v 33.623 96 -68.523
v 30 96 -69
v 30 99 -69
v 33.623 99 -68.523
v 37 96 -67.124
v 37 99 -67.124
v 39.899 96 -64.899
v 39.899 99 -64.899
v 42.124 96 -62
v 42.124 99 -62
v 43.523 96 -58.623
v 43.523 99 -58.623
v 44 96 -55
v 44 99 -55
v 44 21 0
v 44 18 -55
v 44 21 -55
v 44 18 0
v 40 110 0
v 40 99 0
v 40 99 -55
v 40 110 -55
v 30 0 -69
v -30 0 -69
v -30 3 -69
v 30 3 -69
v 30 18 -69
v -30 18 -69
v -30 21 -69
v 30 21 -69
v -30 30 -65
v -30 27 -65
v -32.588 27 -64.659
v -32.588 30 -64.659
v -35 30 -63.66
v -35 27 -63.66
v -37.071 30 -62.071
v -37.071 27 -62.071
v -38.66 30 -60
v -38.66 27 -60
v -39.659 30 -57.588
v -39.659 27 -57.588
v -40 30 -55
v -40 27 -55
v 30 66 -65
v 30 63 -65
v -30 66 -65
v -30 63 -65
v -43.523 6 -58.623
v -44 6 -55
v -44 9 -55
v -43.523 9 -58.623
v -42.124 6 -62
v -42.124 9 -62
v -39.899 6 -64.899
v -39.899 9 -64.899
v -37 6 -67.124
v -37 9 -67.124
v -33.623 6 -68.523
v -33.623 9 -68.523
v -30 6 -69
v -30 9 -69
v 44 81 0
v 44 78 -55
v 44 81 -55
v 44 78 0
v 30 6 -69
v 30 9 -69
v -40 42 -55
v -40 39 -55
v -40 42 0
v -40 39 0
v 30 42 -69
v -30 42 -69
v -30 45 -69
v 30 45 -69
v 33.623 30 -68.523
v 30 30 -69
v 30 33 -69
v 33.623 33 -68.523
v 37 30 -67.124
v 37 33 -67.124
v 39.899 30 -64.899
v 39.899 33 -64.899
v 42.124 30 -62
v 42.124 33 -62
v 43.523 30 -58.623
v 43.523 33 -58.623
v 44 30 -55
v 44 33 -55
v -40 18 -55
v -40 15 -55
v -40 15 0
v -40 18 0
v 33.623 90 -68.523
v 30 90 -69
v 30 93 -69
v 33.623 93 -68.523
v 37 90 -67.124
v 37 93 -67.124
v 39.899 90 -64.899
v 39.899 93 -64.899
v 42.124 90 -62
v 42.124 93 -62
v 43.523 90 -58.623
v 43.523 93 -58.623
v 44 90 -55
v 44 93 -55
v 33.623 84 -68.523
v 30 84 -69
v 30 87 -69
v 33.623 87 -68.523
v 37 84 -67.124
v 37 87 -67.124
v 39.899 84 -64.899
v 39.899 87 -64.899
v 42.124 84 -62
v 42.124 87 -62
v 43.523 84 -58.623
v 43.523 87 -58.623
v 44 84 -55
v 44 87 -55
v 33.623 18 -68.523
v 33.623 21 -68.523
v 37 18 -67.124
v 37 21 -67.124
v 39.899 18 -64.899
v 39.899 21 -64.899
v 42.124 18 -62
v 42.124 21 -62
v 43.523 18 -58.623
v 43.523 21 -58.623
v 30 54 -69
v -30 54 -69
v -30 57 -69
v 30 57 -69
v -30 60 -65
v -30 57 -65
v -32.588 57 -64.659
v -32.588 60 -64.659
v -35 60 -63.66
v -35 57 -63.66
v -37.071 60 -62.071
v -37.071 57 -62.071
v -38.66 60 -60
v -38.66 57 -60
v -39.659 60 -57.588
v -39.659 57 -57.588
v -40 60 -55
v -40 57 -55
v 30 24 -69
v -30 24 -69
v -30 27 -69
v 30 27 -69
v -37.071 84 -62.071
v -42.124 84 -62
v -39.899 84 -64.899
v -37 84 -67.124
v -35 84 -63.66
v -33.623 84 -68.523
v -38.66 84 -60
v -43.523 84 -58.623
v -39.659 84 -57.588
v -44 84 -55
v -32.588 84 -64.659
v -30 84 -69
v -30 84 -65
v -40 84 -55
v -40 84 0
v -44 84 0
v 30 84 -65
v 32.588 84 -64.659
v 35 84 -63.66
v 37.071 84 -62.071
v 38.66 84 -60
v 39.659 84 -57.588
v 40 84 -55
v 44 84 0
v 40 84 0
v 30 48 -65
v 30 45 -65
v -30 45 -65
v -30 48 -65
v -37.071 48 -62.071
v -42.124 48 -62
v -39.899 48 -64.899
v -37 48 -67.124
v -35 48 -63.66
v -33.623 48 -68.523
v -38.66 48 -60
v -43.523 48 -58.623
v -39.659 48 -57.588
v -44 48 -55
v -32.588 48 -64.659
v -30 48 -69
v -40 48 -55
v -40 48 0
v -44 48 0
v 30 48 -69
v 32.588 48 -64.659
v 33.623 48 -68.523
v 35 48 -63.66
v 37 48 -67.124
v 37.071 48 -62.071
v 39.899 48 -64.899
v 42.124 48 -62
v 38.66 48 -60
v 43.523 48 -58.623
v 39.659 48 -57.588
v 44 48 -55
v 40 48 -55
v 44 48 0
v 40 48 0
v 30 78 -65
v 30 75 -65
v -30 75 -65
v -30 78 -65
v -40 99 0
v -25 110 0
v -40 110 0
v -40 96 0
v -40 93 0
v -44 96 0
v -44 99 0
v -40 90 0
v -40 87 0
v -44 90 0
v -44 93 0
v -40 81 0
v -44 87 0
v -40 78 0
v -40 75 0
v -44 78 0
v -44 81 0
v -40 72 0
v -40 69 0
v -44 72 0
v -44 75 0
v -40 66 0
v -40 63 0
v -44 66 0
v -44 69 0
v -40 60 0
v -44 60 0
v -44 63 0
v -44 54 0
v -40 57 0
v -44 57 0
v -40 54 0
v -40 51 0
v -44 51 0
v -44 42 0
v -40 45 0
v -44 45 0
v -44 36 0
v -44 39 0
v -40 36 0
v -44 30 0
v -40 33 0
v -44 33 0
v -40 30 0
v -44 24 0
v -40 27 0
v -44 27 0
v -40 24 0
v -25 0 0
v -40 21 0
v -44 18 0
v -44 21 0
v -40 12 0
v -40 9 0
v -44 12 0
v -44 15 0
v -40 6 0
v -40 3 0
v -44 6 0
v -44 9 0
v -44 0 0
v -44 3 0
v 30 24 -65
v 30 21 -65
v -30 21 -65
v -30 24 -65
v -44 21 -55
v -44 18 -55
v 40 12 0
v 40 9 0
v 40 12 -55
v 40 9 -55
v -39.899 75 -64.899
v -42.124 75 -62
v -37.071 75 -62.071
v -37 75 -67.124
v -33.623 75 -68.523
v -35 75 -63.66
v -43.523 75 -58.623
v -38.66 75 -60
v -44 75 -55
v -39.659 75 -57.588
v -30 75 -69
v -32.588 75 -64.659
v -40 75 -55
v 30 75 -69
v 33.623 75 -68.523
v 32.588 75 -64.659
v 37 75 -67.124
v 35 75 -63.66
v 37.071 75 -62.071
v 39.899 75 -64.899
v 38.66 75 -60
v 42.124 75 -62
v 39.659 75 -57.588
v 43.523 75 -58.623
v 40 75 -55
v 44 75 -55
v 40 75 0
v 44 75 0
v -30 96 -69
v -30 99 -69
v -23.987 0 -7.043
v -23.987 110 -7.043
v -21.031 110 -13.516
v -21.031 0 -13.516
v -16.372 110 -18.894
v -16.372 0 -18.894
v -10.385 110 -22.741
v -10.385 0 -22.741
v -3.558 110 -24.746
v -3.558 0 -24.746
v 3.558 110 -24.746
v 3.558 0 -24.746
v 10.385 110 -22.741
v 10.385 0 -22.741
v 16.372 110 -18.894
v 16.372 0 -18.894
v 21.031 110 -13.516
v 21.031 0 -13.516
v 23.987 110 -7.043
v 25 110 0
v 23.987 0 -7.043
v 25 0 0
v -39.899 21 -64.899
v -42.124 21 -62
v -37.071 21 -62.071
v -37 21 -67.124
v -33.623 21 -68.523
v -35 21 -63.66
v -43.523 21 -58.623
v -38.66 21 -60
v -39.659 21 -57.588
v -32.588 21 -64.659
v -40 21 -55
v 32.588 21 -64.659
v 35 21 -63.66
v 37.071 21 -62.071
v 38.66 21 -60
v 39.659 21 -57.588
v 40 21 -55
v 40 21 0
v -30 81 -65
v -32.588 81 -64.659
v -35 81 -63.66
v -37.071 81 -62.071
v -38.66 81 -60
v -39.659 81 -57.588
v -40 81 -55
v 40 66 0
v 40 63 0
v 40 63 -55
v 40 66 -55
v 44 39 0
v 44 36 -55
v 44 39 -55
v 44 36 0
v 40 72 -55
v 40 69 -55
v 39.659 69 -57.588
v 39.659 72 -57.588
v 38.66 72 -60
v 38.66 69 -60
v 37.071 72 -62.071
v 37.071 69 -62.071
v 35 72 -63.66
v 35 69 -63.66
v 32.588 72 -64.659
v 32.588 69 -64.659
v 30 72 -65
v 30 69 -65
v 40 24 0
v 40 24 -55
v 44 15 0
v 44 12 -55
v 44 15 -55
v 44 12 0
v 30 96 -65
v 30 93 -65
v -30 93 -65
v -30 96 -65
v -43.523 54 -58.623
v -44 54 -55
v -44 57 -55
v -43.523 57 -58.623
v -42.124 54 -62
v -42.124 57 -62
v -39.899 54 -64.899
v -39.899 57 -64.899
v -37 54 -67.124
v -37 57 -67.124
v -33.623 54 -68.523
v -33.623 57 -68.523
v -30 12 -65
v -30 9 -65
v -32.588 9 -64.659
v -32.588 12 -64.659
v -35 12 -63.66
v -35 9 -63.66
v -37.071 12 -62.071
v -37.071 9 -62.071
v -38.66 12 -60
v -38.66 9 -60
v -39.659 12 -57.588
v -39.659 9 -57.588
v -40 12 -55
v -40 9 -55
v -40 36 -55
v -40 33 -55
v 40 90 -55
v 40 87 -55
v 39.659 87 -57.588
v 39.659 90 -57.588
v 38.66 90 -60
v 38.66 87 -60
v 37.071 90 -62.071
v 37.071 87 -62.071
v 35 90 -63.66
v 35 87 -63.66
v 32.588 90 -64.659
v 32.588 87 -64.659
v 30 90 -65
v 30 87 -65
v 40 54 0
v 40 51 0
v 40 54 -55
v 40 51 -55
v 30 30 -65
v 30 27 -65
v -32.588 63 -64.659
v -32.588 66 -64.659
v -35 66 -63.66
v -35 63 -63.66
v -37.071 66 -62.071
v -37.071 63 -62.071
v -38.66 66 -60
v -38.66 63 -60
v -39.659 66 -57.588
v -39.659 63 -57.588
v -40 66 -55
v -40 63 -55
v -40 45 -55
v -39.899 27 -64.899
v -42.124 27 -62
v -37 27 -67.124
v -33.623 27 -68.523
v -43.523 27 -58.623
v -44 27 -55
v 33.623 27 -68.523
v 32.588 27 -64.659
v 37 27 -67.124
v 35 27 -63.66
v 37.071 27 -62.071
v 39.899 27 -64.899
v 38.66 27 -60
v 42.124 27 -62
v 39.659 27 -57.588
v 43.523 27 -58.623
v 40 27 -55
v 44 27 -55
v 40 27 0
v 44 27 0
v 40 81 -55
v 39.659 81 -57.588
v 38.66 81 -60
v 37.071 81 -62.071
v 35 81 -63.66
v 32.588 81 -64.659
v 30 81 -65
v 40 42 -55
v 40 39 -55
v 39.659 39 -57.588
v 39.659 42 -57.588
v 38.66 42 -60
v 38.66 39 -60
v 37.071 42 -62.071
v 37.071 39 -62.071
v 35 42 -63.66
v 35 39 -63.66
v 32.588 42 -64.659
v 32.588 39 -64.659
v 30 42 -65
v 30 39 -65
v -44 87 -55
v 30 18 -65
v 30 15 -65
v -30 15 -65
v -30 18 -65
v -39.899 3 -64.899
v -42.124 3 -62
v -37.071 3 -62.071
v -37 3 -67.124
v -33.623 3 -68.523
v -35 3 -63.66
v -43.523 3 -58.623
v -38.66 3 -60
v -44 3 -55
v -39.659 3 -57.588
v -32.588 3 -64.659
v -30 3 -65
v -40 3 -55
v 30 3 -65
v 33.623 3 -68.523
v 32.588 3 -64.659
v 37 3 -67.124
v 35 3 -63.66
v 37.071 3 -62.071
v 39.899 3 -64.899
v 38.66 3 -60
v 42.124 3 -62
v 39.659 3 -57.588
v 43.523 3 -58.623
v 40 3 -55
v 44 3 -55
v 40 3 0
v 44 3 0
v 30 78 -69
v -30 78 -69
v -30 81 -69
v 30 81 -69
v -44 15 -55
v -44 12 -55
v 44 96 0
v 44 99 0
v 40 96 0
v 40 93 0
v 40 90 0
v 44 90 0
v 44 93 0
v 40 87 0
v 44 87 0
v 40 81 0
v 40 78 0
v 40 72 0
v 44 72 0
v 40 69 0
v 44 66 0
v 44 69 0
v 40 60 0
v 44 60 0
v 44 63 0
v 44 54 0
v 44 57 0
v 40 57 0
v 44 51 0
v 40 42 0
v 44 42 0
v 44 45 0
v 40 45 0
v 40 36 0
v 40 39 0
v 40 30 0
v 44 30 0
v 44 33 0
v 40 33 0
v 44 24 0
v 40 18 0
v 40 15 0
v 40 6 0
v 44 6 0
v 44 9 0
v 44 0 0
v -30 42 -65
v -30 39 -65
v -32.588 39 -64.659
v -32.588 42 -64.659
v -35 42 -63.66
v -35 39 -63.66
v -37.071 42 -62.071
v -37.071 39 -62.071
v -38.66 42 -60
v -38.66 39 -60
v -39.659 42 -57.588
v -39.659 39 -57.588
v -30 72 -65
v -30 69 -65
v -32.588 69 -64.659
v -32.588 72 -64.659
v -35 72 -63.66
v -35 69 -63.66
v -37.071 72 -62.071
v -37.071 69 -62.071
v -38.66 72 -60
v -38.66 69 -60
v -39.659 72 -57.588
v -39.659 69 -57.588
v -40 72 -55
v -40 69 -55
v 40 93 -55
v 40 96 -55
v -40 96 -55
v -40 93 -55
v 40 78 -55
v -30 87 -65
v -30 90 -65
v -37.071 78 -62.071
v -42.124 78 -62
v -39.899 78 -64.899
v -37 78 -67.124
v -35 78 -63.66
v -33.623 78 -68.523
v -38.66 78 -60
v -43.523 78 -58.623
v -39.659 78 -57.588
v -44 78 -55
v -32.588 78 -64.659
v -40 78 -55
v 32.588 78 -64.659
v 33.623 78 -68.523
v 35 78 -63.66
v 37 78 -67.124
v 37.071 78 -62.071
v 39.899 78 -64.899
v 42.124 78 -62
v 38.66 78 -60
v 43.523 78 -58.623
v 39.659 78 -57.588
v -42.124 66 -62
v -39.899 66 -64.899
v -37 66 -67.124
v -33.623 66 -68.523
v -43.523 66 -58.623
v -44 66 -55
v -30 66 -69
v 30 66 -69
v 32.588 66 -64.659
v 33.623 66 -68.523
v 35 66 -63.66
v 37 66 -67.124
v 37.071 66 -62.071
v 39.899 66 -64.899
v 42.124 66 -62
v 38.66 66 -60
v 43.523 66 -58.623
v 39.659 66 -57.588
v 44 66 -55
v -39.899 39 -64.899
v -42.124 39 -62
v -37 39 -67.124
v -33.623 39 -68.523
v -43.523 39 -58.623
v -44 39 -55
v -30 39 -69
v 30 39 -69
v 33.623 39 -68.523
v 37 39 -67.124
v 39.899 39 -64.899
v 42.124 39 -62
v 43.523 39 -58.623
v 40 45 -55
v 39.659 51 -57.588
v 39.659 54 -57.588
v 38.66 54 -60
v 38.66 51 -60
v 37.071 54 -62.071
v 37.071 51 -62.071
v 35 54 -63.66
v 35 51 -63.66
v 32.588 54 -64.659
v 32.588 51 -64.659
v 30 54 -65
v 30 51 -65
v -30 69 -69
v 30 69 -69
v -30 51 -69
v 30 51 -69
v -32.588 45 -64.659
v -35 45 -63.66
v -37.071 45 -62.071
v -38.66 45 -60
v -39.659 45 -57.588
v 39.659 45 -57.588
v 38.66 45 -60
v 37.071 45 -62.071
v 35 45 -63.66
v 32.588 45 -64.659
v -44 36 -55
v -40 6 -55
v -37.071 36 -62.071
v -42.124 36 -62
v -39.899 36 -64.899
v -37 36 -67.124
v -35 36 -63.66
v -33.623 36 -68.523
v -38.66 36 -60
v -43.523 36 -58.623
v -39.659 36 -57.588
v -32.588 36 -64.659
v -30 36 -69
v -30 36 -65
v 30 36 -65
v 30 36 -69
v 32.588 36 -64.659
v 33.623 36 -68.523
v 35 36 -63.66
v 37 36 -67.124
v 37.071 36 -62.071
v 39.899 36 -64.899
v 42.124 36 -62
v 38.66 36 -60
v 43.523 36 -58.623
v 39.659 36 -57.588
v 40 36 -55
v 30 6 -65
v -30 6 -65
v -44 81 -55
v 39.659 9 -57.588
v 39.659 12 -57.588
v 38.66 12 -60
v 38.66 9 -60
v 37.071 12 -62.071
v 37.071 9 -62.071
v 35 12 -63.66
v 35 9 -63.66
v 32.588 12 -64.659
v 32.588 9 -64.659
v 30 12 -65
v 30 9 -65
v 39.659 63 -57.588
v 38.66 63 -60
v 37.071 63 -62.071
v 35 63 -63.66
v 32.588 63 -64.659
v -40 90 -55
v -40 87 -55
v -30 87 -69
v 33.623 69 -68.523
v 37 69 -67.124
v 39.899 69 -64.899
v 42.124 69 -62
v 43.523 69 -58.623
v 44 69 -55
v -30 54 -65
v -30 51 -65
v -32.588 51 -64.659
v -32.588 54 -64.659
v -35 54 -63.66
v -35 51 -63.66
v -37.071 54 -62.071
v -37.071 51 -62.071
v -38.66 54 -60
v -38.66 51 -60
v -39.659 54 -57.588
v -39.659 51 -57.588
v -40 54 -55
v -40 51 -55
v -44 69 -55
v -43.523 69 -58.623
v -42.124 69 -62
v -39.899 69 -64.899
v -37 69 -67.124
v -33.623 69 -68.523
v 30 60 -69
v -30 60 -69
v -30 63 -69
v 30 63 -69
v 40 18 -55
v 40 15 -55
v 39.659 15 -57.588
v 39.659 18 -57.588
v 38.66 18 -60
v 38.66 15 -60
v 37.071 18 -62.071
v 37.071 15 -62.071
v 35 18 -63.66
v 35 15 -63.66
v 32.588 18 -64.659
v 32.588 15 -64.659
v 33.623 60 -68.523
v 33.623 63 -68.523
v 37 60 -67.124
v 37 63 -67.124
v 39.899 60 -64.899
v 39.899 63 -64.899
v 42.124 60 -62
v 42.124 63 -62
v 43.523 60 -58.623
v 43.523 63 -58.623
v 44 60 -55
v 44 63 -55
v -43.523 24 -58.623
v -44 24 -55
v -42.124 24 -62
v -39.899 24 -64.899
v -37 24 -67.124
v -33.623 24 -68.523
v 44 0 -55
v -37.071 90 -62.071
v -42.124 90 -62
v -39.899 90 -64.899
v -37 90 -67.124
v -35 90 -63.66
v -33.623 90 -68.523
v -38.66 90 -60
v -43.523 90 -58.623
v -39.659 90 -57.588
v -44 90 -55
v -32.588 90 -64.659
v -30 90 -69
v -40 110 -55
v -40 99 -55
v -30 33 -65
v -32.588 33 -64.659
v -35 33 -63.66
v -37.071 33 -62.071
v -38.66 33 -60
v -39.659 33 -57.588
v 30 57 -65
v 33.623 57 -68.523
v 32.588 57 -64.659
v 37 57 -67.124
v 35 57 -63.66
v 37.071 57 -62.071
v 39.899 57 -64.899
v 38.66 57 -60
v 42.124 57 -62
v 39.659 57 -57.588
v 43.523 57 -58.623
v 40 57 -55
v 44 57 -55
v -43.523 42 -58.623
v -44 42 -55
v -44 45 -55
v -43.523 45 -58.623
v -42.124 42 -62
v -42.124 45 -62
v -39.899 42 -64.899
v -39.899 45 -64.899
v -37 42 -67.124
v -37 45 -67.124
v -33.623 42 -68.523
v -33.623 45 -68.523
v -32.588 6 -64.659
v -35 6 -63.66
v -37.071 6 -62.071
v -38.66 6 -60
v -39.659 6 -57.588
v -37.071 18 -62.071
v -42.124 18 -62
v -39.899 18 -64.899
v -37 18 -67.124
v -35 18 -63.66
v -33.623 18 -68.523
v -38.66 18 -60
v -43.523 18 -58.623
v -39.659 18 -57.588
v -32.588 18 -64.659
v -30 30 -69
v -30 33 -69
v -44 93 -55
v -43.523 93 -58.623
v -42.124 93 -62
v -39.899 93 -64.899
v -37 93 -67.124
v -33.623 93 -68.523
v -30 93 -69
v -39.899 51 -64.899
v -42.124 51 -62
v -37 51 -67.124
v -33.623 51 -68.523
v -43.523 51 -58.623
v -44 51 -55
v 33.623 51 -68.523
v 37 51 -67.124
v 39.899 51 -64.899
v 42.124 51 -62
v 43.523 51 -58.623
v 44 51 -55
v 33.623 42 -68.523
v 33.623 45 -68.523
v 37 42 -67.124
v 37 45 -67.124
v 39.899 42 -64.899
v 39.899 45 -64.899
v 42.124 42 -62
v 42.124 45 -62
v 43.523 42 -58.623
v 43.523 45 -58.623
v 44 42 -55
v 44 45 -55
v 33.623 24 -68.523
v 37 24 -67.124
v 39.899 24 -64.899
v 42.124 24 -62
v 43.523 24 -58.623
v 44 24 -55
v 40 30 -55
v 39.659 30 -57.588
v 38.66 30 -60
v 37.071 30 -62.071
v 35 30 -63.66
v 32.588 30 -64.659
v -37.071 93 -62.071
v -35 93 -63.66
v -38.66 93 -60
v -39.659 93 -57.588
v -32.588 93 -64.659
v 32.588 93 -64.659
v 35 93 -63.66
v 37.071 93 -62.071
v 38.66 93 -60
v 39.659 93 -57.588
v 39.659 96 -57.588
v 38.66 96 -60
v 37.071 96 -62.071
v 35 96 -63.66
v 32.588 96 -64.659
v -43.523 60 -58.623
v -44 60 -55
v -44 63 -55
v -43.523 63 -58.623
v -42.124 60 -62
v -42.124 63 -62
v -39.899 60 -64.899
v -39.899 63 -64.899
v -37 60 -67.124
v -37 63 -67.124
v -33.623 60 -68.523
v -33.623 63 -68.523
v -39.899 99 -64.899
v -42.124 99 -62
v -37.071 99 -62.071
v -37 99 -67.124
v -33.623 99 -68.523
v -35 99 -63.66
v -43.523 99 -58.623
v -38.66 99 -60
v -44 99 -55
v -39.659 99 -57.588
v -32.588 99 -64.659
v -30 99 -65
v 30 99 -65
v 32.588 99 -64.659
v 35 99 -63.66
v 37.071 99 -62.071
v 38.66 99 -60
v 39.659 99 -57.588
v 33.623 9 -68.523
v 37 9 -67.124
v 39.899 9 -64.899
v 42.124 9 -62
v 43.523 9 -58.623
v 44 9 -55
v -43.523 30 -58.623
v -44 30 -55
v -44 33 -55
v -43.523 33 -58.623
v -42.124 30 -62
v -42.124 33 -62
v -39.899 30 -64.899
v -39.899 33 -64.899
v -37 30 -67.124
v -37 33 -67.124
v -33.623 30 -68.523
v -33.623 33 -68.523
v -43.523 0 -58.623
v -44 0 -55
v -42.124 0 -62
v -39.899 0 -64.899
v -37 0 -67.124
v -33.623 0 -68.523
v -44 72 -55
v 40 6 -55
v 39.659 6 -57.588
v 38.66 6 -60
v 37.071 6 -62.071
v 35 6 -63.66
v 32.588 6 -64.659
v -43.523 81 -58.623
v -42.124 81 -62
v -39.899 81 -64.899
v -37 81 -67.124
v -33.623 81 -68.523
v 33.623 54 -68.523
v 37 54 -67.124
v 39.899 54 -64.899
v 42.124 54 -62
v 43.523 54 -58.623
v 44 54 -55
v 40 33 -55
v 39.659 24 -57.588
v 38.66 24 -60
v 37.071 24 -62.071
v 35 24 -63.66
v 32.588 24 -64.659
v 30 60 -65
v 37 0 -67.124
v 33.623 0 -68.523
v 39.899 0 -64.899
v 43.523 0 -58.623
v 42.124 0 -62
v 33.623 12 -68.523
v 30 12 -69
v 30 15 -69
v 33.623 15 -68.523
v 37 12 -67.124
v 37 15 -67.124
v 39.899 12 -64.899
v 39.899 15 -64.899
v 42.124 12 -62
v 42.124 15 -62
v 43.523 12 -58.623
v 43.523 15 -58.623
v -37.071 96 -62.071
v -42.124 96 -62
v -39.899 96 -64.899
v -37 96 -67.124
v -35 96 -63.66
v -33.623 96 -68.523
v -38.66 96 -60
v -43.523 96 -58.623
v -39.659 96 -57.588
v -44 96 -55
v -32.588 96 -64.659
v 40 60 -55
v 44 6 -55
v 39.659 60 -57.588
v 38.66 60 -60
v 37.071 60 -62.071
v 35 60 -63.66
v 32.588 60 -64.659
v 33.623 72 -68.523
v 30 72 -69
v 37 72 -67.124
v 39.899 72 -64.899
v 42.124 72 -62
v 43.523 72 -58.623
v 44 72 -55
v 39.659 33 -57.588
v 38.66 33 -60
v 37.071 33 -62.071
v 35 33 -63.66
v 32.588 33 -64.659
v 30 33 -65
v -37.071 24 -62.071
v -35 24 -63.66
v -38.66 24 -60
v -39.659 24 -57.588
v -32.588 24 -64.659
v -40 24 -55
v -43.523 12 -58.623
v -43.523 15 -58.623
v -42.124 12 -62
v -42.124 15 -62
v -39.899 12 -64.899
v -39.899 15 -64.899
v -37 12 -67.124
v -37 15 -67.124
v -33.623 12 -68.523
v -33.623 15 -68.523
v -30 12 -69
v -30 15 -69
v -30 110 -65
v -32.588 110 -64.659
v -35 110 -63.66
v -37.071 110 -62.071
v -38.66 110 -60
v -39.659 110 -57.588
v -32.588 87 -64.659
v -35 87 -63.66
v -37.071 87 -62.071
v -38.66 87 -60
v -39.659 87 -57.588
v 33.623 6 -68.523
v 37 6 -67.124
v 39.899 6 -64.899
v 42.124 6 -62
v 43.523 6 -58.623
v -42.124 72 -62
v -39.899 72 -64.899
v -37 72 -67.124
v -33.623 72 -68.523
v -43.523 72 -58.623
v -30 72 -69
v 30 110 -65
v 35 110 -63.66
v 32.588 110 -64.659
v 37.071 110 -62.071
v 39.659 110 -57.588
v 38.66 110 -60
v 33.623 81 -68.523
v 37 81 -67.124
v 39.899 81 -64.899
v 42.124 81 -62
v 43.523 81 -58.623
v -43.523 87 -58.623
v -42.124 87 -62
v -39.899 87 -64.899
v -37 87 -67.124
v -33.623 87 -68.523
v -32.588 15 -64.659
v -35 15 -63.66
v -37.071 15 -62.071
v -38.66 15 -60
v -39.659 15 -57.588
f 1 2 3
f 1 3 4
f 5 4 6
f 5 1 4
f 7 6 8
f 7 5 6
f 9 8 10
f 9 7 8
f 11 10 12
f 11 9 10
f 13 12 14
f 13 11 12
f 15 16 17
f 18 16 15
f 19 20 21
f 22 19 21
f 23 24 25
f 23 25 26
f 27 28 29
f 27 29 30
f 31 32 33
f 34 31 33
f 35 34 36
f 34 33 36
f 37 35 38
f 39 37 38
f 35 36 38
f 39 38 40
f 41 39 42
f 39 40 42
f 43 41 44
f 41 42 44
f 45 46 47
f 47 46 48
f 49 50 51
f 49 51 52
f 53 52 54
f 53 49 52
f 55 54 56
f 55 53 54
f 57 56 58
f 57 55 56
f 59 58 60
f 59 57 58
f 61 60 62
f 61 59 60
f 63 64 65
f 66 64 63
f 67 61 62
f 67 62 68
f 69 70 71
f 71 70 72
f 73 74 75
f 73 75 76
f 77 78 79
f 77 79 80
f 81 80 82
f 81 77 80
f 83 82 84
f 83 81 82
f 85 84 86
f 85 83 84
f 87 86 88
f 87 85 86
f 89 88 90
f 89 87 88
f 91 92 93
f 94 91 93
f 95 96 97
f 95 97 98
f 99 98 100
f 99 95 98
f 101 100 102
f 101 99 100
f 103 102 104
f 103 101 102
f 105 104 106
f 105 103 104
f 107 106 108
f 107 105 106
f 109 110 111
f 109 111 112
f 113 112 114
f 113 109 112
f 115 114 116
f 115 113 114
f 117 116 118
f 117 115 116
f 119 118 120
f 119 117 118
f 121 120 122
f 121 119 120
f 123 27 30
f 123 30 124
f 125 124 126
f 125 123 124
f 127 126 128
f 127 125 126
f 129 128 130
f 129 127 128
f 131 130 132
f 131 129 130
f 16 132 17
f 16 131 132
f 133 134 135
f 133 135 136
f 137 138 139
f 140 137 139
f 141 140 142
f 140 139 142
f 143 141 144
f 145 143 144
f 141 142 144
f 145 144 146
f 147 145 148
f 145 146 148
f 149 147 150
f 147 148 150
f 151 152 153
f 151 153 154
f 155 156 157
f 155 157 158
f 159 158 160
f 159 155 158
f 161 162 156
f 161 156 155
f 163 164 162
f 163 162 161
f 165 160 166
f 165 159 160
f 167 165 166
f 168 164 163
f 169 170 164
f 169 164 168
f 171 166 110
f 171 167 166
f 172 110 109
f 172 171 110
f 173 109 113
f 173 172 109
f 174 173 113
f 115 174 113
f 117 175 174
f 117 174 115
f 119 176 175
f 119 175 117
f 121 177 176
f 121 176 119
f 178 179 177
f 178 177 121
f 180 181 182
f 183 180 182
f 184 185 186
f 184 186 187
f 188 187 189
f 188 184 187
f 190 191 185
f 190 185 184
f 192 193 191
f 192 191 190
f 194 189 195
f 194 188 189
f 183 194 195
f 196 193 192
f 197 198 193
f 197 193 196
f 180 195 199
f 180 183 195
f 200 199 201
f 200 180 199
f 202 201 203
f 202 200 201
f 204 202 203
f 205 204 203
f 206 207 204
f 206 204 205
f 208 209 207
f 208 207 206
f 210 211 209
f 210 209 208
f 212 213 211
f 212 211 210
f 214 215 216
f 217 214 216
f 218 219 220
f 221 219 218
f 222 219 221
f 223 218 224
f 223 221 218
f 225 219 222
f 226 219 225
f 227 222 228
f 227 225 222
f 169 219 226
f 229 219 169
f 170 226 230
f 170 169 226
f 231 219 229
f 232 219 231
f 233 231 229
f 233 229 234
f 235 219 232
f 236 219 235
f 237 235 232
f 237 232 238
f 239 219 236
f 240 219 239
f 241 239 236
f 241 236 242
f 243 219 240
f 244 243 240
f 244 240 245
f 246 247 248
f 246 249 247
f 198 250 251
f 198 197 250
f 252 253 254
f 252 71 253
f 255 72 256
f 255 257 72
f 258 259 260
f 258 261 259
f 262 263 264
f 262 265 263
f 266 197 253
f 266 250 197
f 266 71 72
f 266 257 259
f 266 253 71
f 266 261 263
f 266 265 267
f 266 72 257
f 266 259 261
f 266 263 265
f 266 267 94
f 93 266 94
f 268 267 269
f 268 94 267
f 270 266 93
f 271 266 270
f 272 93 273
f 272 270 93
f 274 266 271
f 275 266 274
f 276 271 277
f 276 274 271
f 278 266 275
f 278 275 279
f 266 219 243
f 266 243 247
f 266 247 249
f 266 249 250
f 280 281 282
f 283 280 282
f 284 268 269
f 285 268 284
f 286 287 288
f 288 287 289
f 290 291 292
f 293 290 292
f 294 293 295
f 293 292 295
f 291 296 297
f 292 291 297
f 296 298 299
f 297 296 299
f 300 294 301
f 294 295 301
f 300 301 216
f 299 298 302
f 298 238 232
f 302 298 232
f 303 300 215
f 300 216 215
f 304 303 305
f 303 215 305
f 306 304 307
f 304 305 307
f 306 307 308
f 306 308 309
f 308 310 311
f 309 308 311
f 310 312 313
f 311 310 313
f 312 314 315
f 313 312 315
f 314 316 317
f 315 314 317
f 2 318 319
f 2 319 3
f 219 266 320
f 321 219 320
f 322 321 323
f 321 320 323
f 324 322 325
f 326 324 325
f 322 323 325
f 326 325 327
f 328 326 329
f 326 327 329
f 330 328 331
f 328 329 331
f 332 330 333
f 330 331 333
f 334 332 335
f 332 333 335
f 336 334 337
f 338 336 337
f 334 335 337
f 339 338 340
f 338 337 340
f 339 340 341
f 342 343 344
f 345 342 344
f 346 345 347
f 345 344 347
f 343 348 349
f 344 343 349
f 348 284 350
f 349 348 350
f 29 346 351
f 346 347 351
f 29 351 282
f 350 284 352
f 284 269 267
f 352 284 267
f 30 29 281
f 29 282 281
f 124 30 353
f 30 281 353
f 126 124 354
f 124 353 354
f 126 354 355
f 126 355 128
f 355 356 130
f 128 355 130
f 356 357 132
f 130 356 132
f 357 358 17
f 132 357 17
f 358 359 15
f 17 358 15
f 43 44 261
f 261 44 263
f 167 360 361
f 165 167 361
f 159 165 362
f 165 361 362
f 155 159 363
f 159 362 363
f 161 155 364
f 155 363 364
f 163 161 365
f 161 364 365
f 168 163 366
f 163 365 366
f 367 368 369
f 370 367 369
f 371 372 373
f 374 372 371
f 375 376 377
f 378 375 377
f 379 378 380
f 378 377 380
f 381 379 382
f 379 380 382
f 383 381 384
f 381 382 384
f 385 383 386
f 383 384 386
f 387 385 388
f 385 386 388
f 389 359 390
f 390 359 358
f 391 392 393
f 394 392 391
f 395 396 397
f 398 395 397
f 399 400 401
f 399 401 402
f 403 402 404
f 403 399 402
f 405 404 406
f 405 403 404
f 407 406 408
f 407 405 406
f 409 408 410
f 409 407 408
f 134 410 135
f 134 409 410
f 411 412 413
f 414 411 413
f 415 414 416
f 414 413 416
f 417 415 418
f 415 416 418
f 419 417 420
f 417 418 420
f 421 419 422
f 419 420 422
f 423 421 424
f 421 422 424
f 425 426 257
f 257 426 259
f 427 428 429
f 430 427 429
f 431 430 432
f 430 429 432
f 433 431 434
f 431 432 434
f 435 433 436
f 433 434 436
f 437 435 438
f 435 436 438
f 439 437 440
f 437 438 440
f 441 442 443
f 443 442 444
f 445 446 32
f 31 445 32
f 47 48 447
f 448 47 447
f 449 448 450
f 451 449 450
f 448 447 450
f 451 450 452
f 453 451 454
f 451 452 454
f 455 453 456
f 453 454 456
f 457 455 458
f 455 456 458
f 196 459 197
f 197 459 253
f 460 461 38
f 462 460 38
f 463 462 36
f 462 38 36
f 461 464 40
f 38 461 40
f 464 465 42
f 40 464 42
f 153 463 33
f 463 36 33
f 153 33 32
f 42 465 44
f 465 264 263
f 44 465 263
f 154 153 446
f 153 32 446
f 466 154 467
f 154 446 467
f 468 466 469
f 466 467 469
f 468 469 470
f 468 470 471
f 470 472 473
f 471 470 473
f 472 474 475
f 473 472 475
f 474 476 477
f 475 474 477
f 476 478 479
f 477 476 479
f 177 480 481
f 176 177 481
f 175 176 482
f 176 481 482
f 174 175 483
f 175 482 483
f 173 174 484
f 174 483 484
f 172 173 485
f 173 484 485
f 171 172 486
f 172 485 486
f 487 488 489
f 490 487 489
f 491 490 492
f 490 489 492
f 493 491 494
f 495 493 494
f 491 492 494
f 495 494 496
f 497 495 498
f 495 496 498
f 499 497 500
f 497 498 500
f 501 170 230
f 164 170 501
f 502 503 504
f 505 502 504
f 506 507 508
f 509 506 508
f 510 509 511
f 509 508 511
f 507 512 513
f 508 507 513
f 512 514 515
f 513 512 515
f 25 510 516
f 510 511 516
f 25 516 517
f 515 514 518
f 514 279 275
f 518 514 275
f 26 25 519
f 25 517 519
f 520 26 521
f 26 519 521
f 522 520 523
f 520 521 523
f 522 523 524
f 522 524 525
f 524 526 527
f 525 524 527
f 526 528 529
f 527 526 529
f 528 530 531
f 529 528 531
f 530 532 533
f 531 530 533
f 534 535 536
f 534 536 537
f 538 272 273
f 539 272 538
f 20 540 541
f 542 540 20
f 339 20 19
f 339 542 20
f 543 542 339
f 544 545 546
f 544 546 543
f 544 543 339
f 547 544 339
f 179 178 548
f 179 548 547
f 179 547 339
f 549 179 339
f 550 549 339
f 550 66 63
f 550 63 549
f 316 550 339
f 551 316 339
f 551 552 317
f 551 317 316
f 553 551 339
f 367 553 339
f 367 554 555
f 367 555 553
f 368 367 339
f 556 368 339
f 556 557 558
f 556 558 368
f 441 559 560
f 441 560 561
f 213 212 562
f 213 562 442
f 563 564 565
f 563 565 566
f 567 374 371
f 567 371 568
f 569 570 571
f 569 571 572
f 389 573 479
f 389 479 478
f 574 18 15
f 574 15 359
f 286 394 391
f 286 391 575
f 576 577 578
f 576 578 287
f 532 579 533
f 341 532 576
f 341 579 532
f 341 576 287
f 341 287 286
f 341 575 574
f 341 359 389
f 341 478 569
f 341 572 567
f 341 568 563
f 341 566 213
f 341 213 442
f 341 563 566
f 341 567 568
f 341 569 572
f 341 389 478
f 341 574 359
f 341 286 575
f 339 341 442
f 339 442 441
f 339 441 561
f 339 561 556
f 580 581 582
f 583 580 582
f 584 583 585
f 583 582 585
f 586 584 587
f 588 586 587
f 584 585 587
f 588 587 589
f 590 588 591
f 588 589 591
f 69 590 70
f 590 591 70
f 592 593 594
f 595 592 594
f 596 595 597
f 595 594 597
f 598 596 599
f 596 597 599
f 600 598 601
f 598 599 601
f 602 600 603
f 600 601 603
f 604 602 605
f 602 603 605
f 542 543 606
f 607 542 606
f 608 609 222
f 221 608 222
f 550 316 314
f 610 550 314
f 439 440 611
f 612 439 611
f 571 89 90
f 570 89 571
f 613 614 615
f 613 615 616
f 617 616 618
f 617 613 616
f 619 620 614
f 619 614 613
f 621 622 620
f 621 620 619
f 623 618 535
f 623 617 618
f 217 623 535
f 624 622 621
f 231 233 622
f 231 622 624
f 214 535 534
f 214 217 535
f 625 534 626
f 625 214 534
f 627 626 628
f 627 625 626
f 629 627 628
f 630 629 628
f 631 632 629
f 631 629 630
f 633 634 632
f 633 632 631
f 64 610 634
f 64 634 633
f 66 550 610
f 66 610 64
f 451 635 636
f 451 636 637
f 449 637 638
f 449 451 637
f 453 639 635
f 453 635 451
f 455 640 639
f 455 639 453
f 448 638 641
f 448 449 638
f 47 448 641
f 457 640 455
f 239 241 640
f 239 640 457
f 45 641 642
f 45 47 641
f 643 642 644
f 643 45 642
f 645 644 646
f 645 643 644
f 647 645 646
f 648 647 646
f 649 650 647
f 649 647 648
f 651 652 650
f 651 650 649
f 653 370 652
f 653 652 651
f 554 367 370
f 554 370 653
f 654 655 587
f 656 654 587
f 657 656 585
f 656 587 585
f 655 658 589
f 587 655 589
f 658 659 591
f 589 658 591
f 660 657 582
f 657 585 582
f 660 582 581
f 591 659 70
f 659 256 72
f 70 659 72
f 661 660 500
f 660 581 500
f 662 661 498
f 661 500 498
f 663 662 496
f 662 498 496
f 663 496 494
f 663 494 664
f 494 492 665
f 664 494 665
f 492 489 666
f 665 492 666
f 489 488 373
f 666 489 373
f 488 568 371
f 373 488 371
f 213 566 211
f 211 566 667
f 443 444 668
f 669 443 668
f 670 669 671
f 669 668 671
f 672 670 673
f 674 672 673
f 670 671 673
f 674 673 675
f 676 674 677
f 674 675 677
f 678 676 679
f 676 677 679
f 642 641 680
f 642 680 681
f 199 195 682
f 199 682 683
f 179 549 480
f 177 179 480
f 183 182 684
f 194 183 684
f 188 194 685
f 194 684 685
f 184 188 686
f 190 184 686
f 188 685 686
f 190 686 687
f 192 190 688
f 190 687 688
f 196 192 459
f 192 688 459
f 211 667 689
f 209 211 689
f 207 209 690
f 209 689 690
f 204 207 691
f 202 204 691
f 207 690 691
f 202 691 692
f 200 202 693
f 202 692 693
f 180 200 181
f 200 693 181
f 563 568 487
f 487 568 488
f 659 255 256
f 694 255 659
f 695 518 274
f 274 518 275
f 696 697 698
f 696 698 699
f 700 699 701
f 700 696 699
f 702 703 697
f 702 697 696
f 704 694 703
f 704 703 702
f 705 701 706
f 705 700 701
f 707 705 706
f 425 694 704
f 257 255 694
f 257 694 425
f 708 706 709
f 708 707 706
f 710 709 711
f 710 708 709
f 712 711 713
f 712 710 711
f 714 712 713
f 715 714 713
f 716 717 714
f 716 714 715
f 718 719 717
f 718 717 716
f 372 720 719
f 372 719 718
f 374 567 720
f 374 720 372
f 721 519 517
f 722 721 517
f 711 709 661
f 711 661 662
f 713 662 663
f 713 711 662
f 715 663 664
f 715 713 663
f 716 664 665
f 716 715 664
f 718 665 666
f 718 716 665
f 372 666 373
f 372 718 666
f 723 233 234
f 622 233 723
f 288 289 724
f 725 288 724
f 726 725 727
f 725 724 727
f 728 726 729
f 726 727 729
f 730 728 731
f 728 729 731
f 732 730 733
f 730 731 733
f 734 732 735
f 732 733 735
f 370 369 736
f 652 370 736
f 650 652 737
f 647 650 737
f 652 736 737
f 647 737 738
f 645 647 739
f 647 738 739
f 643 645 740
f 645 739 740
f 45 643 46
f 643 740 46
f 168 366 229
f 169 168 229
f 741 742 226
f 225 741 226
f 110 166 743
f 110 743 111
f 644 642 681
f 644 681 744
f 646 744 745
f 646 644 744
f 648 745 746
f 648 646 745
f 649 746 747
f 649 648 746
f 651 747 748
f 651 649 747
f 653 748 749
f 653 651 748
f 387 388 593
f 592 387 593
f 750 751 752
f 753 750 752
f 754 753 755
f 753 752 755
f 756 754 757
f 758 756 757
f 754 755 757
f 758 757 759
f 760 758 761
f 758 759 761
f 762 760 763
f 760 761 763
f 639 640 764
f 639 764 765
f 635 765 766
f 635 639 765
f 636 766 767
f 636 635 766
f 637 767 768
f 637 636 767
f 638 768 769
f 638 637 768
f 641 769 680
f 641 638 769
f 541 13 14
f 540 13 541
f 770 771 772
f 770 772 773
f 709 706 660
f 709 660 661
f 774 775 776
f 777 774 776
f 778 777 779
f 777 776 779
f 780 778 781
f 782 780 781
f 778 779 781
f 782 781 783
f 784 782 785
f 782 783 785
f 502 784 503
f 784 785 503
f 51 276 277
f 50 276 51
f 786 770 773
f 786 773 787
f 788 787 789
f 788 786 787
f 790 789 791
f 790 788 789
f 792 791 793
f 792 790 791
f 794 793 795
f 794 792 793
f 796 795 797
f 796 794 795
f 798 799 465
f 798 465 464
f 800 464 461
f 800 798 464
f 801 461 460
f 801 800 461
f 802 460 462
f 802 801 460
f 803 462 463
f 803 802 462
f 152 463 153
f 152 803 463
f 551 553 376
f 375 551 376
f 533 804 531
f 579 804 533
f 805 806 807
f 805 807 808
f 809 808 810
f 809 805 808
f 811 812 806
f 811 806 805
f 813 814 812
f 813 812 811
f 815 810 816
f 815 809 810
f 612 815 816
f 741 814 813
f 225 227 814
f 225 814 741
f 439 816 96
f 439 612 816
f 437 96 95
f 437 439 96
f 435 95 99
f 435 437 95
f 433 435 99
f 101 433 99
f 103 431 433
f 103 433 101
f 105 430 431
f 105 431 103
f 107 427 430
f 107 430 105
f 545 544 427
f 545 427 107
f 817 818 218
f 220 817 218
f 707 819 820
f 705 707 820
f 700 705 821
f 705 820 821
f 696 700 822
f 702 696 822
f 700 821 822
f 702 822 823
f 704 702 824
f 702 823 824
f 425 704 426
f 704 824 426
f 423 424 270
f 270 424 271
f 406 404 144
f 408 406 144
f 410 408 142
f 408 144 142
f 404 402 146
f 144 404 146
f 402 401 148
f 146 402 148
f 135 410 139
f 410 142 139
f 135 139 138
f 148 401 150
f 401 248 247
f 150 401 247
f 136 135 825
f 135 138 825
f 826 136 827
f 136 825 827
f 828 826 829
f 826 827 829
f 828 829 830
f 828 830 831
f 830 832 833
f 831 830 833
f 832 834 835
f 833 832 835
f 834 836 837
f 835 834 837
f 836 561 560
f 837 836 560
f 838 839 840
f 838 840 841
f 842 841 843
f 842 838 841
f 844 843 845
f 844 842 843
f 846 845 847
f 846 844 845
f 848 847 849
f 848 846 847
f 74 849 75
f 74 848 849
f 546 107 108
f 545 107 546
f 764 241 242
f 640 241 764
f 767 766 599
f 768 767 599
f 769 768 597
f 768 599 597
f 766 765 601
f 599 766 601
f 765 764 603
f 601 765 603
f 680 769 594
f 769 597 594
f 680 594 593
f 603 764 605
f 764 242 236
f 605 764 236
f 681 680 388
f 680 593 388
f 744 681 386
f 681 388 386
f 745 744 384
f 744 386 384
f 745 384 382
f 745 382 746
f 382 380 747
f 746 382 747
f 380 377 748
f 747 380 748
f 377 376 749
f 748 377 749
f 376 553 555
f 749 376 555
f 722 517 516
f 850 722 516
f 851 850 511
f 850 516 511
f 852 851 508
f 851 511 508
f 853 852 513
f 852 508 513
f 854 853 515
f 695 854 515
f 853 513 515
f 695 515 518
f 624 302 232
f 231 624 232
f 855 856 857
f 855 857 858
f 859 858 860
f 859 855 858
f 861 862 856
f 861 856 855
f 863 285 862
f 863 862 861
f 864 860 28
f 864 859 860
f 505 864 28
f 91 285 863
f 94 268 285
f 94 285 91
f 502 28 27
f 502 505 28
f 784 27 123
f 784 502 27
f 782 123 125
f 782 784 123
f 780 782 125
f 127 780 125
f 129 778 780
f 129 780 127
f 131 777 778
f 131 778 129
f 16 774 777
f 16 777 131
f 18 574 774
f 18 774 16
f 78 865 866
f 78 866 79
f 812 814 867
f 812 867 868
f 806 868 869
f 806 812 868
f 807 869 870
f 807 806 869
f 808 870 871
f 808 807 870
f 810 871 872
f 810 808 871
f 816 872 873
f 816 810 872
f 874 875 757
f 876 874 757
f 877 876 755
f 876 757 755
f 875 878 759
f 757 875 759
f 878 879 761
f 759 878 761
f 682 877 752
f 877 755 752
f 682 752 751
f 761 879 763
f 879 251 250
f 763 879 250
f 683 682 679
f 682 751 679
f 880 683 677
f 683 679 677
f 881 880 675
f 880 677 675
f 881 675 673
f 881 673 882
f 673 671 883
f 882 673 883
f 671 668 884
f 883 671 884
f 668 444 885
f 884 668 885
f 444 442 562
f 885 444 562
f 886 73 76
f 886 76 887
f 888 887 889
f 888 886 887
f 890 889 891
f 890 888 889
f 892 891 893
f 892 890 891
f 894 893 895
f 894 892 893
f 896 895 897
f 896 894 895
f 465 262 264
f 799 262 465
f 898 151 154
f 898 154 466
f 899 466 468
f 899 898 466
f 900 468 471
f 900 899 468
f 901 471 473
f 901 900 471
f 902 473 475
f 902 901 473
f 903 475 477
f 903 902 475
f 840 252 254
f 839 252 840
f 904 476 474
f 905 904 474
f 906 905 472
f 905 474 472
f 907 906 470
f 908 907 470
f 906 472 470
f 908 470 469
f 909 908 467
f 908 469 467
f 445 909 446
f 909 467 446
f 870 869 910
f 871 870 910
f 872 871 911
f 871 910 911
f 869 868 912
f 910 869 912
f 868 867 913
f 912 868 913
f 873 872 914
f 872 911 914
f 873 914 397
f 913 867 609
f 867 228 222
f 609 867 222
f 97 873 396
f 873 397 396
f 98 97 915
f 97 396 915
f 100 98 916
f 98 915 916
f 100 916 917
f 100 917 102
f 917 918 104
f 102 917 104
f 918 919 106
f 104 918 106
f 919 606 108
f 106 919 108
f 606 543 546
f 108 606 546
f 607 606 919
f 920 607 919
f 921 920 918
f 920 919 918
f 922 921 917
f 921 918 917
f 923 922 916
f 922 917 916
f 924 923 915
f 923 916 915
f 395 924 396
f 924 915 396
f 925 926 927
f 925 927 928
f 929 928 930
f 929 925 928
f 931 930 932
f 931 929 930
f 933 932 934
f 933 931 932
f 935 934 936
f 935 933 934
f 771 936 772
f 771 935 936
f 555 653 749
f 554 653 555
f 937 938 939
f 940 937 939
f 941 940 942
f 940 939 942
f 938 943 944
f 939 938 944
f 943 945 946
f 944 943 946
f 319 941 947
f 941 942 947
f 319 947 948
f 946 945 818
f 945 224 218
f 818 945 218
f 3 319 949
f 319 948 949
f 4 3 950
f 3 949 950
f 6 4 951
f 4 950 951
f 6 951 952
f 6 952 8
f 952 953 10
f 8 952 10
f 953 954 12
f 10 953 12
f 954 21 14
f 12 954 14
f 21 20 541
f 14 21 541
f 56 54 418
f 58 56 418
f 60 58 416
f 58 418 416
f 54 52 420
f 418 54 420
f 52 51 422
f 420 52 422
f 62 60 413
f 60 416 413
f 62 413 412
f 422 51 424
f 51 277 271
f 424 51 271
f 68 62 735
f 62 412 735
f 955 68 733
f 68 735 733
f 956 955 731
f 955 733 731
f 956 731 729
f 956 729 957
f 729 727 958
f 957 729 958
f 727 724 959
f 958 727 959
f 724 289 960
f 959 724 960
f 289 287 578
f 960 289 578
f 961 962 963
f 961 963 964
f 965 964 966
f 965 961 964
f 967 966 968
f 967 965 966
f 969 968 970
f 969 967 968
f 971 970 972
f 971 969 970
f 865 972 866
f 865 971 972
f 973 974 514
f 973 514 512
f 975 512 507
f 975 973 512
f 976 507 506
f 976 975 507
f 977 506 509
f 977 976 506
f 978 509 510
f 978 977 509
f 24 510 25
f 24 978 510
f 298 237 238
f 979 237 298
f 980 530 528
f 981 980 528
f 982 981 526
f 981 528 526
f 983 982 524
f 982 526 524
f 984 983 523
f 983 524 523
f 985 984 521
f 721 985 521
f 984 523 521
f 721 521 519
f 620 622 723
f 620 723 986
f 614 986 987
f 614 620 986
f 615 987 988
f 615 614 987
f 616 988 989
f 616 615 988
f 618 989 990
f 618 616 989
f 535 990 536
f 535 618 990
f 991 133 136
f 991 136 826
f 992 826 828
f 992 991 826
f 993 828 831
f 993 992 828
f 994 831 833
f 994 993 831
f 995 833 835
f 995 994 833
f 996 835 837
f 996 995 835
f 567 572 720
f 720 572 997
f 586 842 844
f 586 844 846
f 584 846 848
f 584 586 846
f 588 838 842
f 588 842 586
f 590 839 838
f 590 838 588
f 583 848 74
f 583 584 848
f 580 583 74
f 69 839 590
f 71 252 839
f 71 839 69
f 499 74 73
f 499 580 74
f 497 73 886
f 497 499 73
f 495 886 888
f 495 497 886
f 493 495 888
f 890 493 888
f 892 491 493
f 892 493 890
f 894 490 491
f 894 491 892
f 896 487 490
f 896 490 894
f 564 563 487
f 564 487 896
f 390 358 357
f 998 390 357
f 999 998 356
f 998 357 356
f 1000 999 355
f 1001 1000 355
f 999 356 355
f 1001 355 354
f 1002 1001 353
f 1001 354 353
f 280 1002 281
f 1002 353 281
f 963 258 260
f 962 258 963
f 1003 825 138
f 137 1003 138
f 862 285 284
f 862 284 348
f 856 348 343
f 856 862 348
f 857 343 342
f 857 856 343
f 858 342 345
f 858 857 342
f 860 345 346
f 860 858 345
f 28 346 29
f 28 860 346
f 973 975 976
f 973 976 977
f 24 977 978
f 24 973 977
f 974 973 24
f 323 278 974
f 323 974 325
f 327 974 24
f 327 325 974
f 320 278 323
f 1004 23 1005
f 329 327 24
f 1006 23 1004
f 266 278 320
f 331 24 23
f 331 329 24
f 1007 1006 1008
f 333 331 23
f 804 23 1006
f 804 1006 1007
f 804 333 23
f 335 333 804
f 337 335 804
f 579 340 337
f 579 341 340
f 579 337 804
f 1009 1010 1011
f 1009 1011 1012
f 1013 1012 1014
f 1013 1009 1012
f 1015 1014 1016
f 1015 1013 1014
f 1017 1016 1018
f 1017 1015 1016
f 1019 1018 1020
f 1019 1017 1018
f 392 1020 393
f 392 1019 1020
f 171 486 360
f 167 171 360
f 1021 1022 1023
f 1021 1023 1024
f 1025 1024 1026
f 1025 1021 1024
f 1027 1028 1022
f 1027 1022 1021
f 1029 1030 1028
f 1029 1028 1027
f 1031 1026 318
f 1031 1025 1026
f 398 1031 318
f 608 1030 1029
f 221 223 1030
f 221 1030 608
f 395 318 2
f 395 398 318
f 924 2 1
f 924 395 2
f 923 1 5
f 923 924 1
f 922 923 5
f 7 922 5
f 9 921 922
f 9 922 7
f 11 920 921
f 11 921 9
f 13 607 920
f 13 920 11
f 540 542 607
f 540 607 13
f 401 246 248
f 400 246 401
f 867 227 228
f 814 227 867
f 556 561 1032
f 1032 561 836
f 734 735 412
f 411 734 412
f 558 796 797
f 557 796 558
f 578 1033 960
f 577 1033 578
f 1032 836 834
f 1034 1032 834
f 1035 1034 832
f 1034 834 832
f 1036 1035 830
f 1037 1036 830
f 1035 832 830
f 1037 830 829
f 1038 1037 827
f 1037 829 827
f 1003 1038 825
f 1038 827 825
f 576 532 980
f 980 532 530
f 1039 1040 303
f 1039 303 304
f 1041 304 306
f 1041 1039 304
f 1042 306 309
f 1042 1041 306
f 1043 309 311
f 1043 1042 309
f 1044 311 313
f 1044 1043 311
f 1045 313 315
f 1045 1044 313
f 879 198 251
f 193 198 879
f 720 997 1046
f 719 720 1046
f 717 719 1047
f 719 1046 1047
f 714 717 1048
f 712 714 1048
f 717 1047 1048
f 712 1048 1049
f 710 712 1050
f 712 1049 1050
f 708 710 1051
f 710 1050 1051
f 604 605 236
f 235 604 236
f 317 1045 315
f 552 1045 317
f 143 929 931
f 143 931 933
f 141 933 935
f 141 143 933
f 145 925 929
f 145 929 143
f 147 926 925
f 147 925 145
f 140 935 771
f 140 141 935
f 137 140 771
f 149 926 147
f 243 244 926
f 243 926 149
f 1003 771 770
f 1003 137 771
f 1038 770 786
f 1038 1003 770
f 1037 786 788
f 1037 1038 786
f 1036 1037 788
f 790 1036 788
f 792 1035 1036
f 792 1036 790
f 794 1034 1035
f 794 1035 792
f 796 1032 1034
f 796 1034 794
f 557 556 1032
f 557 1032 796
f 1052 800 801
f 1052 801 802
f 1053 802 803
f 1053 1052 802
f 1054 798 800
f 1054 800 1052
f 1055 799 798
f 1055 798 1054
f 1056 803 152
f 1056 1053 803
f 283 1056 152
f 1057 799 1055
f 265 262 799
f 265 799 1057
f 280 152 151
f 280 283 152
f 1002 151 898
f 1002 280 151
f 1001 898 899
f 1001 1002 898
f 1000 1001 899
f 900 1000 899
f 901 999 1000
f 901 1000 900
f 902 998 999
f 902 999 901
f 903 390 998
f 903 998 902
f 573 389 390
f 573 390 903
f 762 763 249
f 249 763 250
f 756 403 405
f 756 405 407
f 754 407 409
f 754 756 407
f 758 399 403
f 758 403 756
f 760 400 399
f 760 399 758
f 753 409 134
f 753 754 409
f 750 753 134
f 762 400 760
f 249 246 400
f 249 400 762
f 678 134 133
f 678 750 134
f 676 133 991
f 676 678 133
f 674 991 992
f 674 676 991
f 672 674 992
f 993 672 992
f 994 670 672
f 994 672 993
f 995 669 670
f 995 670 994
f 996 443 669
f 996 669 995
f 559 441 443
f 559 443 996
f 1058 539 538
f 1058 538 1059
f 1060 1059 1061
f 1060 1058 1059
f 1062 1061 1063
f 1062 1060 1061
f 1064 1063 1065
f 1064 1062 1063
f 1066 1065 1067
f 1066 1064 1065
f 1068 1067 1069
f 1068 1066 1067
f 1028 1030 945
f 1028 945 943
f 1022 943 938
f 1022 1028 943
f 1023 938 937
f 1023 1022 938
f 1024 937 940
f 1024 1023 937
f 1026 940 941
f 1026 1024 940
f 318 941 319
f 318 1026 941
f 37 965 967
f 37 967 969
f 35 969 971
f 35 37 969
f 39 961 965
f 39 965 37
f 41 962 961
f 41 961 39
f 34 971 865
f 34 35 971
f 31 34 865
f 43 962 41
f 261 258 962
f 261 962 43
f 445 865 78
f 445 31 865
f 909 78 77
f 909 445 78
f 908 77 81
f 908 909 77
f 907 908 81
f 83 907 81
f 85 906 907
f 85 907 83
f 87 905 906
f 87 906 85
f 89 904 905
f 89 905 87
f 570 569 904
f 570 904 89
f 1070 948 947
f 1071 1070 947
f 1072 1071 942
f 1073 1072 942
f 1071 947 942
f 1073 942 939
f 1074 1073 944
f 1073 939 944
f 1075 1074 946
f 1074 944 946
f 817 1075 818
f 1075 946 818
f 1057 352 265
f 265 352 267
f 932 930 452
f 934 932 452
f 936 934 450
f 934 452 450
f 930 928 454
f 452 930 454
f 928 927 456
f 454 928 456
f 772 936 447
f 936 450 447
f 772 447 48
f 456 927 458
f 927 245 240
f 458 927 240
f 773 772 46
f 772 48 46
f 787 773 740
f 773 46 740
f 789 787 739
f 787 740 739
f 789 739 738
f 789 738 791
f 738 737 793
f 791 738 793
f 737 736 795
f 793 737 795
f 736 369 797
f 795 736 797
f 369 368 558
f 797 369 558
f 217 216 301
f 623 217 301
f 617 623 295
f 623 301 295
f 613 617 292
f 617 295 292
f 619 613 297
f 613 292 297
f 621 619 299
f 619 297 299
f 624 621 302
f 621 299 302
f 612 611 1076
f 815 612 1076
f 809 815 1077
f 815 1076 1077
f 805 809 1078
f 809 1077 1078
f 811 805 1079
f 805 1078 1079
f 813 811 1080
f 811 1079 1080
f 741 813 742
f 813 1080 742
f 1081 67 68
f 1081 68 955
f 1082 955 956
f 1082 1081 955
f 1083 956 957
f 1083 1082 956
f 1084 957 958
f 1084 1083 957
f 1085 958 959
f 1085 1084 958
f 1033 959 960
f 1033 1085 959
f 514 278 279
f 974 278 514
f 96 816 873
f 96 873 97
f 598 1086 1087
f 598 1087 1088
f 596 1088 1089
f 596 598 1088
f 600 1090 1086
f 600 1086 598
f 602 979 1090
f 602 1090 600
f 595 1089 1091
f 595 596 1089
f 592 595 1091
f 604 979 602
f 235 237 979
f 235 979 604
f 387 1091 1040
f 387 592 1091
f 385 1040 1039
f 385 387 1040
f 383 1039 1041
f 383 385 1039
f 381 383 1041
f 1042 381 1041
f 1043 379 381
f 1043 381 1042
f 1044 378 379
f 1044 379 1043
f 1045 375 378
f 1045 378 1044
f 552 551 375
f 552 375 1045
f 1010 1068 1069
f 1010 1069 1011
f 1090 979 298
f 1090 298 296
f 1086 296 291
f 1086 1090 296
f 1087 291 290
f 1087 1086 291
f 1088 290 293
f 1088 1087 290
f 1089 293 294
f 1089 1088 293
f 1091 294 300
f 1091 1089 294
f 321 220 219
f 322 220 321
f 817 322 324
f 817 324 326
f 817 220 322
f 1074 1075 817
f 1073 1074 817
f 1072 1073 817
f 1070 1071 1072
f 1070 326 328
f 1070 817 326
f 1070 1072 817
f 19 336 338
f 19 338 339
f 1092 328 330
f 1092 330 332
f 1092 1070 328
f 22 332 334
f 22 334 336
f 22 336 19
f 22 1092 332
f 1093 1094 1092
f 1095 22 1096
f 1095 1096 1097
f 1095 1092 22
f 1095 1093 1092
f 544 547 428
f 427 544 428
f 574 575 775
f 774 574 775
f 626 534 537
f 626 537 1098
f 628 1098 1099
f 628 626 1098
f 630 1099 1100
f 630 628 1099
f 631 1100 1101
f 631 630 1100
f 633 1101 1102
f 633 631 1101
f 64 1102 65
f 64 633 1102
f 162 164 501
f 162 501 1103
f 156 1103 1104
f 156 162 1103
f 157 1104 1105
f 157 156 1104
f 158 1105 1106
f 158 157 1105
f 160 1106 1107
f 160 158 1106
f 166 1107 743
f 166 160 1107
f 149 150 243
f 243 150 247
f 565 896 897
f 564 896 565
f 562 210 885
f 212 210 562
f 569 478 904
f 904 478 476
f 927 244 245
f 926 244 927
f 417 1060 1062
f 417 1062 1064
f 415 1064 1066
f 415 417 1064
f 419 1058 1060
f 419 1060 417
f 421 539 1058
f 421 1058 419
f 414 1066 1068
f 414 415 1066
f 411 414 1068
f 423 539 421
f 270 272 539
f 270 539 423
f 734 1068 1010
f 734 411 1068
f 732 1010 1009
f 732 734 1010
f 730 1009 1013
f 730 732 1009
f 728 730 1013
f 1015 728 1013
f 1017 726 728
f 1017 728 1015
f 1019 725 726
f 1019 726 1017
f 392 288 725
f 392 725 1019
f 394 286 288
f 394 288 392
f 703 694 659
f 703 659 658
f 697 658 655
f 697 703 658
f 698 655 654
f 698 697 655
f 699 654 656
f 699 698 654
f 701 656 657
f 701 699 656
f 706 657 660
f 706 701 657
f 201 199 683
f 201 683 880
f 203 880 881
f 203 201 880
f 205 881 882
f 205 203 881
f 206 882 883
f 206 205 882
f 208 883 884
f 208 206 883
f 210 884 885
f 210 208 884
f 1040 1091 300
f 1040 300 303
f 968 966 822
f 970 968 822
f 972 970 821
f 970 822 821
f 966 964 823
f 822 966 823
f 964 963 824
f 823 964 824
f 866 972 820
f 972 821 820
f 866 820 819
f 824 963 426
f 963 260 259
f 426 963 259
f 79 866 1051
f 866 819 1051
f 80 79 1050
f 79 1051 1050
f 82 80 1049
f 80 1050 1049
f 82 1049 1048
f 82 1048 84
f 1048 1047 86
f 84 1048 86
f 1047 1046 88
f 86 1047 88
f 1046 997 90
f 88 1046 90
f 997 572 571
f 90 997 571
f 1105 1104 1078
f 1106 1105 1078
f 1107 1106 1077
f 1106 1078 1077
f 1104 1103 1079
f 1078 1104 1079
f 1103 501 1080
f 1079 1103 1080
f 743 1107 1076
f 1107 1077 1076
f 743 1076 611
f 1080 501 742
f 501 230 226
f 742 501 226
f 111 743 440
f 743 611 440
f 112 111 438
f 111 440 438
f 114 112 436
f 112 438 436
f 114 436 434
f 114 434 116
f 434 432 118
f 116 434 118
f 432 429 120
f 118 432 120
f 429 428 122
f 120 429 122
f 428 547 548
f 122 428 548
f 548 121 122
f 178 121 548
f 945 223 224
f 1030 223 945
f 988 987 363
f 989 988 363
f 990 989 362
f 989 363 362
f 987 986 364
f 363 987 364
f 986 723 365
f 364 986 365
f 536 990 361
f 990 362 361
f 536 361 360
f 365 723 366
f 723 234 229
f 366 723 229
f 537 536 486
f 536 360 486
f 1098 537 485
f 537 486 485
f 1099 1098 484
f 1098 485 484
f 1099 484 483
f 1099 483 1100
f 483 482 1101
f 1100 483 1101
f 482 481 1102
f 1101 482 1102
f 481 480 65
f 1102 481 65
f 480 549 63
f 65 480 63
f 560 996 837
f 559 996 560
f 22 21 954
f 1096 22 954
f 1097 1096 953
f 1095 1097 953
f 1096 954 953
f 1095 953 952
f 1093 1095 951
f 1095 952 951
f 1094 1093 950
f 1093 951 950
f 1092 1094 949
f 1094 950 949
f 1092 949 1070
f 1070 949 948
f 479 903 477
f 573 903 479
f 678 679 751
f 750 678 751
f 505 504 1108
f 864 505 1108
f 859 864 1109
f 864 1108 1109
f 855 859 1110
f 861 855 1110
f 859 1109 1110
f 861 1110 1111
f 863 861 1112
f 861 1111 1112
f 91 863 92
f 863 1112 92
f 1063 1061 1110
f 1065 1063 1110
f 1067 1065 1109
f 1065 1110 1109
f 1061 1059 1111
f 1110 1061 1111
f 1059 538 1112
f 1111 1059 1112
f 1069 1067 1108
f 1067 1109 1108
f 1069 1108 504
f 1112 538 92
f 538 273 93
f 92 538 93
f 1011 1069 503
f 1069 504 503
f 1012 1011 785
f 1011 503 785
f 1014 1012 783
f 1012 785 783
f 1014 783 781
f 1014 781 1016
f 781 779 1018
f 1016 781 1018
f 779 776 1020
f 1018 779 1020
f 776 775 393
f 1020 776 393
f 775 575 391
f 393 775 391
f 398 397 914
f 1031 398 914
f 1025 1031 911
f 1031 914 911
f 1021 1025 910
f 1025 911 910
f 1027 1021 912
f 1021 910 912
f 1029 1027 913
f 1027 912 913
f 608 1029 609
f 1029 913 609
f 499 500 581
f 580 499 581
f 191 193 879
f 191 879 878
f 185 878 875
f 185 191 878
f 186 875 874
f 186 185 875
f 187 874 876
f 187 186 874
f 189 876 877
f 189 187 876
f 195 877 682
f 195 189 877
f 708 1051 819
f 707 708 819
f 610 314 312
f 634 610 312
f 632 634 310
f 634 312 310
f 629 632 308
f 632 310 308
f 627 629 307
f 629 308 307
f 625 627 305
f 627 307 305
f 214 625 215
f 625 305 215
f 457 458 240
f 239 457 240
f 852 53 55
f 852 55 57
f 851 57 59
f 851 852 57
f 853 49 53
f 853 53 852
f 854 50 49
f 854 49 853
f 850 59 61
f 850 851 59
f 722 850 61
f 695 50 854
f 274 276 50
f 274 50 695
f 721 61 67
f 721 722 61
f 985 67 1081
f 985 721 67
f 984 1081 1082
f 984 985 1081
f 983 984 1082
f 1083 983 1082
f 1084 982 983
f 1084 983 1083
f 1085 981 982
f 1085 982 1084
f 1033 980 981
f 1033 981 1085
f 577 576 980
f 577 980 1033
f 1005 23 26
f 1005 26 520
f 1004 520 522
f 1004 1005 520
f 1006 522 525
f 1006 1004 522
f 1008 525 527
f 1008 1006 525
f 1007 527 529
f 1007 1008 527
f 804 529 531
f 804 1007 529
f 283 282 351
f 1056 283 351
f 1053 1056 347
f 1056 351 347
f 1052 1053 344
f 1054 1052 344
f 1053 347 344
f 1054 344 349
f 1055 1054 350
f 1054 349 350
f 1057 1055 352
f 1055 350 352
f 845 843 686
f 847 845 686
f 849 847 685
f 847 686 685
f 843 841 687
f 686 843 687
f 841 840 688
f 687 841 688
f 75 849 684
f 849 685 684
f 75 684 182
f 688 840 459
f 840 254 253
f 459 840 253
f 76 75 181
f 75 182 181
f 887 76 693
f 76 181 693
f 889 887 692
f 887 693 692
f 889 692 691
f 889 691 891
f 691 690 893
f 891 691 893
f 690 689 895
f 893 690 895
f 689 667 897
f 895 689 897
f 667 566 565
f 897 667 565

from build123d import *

# Parameters (mm, degrees)
BOSS_EXTRUDE2_DEPTH = 110
BOSS_EXTRUDE4_DEPTH = 3
LPATTERN1_COUNT     = 17
LPATTERN1_PITCH     = 6


with BuildPart() as part:
    # Sketch1 → Boss-Extrude2 (new body)
    with BuildSketch(Plane(origin=(0, 0, 0), x_dir=(1, 0, 0), z_dir=(0, 1, 0))):
        with BuildLine():
            Line((25, 0), (40, 0))
            Line((40, 0), (40, 55))
            ThreePointArc((40, 55), (37.071067812, 62.071067812), (30, 65))
            Line((30, 65), (-30, 65))
            ThreePointArc((-30, 65), (-37.071067812, 62.071067812), (-40, 55))
            Line((-40, 55), (-40, 0))
            Line((-40, 0), (-25, 0))
            ThreePointArc((-25, 0), (0, 25), (25, 0))
        make_face()
    extrude(amount=BOSS_EXTRUDE2_DEPTH)

    # Sketch3 → Boss-Extrude4 (add)
    with BuildSketch(Plane.XZ):
        with BuildLine():
            Line((-44, 0), (-44, -55))
            ThreePointArc((-44, -55), (-39.899494937, -64.899494937), (-30, -69))
            Line((-30, -69), (30, -69))
            ThreePointArc((30, -69), (39.899494937, -64.899494937), (44, -55))
            Line((44, -55), (44, 0))
            Line((44, 0), (40, 0))
            Line((40, 0), (40, -55))
            ThreePointArc((40, -55), (37.071067812, -62.071067812), (30, -65))
            Line((30, -65), (-30, -65))
            ThreePointArc((-30, -65), (-37.071067812, -62.071067812), (-40, -55))
            Line((-40, -55), (-40, 0))
            Line((-40, 0), (-44, 0))
        make_face()
    boss_extrude4 = extrude(amount=-BOSS_EXTRUDE4_DEPTH)

    # LPattern1: Boss-Extrude4 ×17
    with Locations(*[(0, i * LPATTERN1_PITCH, 0) for i in range(1, LPATTERN1_COUNT)]):
        add(boss_extrude4)


solid = part.part
